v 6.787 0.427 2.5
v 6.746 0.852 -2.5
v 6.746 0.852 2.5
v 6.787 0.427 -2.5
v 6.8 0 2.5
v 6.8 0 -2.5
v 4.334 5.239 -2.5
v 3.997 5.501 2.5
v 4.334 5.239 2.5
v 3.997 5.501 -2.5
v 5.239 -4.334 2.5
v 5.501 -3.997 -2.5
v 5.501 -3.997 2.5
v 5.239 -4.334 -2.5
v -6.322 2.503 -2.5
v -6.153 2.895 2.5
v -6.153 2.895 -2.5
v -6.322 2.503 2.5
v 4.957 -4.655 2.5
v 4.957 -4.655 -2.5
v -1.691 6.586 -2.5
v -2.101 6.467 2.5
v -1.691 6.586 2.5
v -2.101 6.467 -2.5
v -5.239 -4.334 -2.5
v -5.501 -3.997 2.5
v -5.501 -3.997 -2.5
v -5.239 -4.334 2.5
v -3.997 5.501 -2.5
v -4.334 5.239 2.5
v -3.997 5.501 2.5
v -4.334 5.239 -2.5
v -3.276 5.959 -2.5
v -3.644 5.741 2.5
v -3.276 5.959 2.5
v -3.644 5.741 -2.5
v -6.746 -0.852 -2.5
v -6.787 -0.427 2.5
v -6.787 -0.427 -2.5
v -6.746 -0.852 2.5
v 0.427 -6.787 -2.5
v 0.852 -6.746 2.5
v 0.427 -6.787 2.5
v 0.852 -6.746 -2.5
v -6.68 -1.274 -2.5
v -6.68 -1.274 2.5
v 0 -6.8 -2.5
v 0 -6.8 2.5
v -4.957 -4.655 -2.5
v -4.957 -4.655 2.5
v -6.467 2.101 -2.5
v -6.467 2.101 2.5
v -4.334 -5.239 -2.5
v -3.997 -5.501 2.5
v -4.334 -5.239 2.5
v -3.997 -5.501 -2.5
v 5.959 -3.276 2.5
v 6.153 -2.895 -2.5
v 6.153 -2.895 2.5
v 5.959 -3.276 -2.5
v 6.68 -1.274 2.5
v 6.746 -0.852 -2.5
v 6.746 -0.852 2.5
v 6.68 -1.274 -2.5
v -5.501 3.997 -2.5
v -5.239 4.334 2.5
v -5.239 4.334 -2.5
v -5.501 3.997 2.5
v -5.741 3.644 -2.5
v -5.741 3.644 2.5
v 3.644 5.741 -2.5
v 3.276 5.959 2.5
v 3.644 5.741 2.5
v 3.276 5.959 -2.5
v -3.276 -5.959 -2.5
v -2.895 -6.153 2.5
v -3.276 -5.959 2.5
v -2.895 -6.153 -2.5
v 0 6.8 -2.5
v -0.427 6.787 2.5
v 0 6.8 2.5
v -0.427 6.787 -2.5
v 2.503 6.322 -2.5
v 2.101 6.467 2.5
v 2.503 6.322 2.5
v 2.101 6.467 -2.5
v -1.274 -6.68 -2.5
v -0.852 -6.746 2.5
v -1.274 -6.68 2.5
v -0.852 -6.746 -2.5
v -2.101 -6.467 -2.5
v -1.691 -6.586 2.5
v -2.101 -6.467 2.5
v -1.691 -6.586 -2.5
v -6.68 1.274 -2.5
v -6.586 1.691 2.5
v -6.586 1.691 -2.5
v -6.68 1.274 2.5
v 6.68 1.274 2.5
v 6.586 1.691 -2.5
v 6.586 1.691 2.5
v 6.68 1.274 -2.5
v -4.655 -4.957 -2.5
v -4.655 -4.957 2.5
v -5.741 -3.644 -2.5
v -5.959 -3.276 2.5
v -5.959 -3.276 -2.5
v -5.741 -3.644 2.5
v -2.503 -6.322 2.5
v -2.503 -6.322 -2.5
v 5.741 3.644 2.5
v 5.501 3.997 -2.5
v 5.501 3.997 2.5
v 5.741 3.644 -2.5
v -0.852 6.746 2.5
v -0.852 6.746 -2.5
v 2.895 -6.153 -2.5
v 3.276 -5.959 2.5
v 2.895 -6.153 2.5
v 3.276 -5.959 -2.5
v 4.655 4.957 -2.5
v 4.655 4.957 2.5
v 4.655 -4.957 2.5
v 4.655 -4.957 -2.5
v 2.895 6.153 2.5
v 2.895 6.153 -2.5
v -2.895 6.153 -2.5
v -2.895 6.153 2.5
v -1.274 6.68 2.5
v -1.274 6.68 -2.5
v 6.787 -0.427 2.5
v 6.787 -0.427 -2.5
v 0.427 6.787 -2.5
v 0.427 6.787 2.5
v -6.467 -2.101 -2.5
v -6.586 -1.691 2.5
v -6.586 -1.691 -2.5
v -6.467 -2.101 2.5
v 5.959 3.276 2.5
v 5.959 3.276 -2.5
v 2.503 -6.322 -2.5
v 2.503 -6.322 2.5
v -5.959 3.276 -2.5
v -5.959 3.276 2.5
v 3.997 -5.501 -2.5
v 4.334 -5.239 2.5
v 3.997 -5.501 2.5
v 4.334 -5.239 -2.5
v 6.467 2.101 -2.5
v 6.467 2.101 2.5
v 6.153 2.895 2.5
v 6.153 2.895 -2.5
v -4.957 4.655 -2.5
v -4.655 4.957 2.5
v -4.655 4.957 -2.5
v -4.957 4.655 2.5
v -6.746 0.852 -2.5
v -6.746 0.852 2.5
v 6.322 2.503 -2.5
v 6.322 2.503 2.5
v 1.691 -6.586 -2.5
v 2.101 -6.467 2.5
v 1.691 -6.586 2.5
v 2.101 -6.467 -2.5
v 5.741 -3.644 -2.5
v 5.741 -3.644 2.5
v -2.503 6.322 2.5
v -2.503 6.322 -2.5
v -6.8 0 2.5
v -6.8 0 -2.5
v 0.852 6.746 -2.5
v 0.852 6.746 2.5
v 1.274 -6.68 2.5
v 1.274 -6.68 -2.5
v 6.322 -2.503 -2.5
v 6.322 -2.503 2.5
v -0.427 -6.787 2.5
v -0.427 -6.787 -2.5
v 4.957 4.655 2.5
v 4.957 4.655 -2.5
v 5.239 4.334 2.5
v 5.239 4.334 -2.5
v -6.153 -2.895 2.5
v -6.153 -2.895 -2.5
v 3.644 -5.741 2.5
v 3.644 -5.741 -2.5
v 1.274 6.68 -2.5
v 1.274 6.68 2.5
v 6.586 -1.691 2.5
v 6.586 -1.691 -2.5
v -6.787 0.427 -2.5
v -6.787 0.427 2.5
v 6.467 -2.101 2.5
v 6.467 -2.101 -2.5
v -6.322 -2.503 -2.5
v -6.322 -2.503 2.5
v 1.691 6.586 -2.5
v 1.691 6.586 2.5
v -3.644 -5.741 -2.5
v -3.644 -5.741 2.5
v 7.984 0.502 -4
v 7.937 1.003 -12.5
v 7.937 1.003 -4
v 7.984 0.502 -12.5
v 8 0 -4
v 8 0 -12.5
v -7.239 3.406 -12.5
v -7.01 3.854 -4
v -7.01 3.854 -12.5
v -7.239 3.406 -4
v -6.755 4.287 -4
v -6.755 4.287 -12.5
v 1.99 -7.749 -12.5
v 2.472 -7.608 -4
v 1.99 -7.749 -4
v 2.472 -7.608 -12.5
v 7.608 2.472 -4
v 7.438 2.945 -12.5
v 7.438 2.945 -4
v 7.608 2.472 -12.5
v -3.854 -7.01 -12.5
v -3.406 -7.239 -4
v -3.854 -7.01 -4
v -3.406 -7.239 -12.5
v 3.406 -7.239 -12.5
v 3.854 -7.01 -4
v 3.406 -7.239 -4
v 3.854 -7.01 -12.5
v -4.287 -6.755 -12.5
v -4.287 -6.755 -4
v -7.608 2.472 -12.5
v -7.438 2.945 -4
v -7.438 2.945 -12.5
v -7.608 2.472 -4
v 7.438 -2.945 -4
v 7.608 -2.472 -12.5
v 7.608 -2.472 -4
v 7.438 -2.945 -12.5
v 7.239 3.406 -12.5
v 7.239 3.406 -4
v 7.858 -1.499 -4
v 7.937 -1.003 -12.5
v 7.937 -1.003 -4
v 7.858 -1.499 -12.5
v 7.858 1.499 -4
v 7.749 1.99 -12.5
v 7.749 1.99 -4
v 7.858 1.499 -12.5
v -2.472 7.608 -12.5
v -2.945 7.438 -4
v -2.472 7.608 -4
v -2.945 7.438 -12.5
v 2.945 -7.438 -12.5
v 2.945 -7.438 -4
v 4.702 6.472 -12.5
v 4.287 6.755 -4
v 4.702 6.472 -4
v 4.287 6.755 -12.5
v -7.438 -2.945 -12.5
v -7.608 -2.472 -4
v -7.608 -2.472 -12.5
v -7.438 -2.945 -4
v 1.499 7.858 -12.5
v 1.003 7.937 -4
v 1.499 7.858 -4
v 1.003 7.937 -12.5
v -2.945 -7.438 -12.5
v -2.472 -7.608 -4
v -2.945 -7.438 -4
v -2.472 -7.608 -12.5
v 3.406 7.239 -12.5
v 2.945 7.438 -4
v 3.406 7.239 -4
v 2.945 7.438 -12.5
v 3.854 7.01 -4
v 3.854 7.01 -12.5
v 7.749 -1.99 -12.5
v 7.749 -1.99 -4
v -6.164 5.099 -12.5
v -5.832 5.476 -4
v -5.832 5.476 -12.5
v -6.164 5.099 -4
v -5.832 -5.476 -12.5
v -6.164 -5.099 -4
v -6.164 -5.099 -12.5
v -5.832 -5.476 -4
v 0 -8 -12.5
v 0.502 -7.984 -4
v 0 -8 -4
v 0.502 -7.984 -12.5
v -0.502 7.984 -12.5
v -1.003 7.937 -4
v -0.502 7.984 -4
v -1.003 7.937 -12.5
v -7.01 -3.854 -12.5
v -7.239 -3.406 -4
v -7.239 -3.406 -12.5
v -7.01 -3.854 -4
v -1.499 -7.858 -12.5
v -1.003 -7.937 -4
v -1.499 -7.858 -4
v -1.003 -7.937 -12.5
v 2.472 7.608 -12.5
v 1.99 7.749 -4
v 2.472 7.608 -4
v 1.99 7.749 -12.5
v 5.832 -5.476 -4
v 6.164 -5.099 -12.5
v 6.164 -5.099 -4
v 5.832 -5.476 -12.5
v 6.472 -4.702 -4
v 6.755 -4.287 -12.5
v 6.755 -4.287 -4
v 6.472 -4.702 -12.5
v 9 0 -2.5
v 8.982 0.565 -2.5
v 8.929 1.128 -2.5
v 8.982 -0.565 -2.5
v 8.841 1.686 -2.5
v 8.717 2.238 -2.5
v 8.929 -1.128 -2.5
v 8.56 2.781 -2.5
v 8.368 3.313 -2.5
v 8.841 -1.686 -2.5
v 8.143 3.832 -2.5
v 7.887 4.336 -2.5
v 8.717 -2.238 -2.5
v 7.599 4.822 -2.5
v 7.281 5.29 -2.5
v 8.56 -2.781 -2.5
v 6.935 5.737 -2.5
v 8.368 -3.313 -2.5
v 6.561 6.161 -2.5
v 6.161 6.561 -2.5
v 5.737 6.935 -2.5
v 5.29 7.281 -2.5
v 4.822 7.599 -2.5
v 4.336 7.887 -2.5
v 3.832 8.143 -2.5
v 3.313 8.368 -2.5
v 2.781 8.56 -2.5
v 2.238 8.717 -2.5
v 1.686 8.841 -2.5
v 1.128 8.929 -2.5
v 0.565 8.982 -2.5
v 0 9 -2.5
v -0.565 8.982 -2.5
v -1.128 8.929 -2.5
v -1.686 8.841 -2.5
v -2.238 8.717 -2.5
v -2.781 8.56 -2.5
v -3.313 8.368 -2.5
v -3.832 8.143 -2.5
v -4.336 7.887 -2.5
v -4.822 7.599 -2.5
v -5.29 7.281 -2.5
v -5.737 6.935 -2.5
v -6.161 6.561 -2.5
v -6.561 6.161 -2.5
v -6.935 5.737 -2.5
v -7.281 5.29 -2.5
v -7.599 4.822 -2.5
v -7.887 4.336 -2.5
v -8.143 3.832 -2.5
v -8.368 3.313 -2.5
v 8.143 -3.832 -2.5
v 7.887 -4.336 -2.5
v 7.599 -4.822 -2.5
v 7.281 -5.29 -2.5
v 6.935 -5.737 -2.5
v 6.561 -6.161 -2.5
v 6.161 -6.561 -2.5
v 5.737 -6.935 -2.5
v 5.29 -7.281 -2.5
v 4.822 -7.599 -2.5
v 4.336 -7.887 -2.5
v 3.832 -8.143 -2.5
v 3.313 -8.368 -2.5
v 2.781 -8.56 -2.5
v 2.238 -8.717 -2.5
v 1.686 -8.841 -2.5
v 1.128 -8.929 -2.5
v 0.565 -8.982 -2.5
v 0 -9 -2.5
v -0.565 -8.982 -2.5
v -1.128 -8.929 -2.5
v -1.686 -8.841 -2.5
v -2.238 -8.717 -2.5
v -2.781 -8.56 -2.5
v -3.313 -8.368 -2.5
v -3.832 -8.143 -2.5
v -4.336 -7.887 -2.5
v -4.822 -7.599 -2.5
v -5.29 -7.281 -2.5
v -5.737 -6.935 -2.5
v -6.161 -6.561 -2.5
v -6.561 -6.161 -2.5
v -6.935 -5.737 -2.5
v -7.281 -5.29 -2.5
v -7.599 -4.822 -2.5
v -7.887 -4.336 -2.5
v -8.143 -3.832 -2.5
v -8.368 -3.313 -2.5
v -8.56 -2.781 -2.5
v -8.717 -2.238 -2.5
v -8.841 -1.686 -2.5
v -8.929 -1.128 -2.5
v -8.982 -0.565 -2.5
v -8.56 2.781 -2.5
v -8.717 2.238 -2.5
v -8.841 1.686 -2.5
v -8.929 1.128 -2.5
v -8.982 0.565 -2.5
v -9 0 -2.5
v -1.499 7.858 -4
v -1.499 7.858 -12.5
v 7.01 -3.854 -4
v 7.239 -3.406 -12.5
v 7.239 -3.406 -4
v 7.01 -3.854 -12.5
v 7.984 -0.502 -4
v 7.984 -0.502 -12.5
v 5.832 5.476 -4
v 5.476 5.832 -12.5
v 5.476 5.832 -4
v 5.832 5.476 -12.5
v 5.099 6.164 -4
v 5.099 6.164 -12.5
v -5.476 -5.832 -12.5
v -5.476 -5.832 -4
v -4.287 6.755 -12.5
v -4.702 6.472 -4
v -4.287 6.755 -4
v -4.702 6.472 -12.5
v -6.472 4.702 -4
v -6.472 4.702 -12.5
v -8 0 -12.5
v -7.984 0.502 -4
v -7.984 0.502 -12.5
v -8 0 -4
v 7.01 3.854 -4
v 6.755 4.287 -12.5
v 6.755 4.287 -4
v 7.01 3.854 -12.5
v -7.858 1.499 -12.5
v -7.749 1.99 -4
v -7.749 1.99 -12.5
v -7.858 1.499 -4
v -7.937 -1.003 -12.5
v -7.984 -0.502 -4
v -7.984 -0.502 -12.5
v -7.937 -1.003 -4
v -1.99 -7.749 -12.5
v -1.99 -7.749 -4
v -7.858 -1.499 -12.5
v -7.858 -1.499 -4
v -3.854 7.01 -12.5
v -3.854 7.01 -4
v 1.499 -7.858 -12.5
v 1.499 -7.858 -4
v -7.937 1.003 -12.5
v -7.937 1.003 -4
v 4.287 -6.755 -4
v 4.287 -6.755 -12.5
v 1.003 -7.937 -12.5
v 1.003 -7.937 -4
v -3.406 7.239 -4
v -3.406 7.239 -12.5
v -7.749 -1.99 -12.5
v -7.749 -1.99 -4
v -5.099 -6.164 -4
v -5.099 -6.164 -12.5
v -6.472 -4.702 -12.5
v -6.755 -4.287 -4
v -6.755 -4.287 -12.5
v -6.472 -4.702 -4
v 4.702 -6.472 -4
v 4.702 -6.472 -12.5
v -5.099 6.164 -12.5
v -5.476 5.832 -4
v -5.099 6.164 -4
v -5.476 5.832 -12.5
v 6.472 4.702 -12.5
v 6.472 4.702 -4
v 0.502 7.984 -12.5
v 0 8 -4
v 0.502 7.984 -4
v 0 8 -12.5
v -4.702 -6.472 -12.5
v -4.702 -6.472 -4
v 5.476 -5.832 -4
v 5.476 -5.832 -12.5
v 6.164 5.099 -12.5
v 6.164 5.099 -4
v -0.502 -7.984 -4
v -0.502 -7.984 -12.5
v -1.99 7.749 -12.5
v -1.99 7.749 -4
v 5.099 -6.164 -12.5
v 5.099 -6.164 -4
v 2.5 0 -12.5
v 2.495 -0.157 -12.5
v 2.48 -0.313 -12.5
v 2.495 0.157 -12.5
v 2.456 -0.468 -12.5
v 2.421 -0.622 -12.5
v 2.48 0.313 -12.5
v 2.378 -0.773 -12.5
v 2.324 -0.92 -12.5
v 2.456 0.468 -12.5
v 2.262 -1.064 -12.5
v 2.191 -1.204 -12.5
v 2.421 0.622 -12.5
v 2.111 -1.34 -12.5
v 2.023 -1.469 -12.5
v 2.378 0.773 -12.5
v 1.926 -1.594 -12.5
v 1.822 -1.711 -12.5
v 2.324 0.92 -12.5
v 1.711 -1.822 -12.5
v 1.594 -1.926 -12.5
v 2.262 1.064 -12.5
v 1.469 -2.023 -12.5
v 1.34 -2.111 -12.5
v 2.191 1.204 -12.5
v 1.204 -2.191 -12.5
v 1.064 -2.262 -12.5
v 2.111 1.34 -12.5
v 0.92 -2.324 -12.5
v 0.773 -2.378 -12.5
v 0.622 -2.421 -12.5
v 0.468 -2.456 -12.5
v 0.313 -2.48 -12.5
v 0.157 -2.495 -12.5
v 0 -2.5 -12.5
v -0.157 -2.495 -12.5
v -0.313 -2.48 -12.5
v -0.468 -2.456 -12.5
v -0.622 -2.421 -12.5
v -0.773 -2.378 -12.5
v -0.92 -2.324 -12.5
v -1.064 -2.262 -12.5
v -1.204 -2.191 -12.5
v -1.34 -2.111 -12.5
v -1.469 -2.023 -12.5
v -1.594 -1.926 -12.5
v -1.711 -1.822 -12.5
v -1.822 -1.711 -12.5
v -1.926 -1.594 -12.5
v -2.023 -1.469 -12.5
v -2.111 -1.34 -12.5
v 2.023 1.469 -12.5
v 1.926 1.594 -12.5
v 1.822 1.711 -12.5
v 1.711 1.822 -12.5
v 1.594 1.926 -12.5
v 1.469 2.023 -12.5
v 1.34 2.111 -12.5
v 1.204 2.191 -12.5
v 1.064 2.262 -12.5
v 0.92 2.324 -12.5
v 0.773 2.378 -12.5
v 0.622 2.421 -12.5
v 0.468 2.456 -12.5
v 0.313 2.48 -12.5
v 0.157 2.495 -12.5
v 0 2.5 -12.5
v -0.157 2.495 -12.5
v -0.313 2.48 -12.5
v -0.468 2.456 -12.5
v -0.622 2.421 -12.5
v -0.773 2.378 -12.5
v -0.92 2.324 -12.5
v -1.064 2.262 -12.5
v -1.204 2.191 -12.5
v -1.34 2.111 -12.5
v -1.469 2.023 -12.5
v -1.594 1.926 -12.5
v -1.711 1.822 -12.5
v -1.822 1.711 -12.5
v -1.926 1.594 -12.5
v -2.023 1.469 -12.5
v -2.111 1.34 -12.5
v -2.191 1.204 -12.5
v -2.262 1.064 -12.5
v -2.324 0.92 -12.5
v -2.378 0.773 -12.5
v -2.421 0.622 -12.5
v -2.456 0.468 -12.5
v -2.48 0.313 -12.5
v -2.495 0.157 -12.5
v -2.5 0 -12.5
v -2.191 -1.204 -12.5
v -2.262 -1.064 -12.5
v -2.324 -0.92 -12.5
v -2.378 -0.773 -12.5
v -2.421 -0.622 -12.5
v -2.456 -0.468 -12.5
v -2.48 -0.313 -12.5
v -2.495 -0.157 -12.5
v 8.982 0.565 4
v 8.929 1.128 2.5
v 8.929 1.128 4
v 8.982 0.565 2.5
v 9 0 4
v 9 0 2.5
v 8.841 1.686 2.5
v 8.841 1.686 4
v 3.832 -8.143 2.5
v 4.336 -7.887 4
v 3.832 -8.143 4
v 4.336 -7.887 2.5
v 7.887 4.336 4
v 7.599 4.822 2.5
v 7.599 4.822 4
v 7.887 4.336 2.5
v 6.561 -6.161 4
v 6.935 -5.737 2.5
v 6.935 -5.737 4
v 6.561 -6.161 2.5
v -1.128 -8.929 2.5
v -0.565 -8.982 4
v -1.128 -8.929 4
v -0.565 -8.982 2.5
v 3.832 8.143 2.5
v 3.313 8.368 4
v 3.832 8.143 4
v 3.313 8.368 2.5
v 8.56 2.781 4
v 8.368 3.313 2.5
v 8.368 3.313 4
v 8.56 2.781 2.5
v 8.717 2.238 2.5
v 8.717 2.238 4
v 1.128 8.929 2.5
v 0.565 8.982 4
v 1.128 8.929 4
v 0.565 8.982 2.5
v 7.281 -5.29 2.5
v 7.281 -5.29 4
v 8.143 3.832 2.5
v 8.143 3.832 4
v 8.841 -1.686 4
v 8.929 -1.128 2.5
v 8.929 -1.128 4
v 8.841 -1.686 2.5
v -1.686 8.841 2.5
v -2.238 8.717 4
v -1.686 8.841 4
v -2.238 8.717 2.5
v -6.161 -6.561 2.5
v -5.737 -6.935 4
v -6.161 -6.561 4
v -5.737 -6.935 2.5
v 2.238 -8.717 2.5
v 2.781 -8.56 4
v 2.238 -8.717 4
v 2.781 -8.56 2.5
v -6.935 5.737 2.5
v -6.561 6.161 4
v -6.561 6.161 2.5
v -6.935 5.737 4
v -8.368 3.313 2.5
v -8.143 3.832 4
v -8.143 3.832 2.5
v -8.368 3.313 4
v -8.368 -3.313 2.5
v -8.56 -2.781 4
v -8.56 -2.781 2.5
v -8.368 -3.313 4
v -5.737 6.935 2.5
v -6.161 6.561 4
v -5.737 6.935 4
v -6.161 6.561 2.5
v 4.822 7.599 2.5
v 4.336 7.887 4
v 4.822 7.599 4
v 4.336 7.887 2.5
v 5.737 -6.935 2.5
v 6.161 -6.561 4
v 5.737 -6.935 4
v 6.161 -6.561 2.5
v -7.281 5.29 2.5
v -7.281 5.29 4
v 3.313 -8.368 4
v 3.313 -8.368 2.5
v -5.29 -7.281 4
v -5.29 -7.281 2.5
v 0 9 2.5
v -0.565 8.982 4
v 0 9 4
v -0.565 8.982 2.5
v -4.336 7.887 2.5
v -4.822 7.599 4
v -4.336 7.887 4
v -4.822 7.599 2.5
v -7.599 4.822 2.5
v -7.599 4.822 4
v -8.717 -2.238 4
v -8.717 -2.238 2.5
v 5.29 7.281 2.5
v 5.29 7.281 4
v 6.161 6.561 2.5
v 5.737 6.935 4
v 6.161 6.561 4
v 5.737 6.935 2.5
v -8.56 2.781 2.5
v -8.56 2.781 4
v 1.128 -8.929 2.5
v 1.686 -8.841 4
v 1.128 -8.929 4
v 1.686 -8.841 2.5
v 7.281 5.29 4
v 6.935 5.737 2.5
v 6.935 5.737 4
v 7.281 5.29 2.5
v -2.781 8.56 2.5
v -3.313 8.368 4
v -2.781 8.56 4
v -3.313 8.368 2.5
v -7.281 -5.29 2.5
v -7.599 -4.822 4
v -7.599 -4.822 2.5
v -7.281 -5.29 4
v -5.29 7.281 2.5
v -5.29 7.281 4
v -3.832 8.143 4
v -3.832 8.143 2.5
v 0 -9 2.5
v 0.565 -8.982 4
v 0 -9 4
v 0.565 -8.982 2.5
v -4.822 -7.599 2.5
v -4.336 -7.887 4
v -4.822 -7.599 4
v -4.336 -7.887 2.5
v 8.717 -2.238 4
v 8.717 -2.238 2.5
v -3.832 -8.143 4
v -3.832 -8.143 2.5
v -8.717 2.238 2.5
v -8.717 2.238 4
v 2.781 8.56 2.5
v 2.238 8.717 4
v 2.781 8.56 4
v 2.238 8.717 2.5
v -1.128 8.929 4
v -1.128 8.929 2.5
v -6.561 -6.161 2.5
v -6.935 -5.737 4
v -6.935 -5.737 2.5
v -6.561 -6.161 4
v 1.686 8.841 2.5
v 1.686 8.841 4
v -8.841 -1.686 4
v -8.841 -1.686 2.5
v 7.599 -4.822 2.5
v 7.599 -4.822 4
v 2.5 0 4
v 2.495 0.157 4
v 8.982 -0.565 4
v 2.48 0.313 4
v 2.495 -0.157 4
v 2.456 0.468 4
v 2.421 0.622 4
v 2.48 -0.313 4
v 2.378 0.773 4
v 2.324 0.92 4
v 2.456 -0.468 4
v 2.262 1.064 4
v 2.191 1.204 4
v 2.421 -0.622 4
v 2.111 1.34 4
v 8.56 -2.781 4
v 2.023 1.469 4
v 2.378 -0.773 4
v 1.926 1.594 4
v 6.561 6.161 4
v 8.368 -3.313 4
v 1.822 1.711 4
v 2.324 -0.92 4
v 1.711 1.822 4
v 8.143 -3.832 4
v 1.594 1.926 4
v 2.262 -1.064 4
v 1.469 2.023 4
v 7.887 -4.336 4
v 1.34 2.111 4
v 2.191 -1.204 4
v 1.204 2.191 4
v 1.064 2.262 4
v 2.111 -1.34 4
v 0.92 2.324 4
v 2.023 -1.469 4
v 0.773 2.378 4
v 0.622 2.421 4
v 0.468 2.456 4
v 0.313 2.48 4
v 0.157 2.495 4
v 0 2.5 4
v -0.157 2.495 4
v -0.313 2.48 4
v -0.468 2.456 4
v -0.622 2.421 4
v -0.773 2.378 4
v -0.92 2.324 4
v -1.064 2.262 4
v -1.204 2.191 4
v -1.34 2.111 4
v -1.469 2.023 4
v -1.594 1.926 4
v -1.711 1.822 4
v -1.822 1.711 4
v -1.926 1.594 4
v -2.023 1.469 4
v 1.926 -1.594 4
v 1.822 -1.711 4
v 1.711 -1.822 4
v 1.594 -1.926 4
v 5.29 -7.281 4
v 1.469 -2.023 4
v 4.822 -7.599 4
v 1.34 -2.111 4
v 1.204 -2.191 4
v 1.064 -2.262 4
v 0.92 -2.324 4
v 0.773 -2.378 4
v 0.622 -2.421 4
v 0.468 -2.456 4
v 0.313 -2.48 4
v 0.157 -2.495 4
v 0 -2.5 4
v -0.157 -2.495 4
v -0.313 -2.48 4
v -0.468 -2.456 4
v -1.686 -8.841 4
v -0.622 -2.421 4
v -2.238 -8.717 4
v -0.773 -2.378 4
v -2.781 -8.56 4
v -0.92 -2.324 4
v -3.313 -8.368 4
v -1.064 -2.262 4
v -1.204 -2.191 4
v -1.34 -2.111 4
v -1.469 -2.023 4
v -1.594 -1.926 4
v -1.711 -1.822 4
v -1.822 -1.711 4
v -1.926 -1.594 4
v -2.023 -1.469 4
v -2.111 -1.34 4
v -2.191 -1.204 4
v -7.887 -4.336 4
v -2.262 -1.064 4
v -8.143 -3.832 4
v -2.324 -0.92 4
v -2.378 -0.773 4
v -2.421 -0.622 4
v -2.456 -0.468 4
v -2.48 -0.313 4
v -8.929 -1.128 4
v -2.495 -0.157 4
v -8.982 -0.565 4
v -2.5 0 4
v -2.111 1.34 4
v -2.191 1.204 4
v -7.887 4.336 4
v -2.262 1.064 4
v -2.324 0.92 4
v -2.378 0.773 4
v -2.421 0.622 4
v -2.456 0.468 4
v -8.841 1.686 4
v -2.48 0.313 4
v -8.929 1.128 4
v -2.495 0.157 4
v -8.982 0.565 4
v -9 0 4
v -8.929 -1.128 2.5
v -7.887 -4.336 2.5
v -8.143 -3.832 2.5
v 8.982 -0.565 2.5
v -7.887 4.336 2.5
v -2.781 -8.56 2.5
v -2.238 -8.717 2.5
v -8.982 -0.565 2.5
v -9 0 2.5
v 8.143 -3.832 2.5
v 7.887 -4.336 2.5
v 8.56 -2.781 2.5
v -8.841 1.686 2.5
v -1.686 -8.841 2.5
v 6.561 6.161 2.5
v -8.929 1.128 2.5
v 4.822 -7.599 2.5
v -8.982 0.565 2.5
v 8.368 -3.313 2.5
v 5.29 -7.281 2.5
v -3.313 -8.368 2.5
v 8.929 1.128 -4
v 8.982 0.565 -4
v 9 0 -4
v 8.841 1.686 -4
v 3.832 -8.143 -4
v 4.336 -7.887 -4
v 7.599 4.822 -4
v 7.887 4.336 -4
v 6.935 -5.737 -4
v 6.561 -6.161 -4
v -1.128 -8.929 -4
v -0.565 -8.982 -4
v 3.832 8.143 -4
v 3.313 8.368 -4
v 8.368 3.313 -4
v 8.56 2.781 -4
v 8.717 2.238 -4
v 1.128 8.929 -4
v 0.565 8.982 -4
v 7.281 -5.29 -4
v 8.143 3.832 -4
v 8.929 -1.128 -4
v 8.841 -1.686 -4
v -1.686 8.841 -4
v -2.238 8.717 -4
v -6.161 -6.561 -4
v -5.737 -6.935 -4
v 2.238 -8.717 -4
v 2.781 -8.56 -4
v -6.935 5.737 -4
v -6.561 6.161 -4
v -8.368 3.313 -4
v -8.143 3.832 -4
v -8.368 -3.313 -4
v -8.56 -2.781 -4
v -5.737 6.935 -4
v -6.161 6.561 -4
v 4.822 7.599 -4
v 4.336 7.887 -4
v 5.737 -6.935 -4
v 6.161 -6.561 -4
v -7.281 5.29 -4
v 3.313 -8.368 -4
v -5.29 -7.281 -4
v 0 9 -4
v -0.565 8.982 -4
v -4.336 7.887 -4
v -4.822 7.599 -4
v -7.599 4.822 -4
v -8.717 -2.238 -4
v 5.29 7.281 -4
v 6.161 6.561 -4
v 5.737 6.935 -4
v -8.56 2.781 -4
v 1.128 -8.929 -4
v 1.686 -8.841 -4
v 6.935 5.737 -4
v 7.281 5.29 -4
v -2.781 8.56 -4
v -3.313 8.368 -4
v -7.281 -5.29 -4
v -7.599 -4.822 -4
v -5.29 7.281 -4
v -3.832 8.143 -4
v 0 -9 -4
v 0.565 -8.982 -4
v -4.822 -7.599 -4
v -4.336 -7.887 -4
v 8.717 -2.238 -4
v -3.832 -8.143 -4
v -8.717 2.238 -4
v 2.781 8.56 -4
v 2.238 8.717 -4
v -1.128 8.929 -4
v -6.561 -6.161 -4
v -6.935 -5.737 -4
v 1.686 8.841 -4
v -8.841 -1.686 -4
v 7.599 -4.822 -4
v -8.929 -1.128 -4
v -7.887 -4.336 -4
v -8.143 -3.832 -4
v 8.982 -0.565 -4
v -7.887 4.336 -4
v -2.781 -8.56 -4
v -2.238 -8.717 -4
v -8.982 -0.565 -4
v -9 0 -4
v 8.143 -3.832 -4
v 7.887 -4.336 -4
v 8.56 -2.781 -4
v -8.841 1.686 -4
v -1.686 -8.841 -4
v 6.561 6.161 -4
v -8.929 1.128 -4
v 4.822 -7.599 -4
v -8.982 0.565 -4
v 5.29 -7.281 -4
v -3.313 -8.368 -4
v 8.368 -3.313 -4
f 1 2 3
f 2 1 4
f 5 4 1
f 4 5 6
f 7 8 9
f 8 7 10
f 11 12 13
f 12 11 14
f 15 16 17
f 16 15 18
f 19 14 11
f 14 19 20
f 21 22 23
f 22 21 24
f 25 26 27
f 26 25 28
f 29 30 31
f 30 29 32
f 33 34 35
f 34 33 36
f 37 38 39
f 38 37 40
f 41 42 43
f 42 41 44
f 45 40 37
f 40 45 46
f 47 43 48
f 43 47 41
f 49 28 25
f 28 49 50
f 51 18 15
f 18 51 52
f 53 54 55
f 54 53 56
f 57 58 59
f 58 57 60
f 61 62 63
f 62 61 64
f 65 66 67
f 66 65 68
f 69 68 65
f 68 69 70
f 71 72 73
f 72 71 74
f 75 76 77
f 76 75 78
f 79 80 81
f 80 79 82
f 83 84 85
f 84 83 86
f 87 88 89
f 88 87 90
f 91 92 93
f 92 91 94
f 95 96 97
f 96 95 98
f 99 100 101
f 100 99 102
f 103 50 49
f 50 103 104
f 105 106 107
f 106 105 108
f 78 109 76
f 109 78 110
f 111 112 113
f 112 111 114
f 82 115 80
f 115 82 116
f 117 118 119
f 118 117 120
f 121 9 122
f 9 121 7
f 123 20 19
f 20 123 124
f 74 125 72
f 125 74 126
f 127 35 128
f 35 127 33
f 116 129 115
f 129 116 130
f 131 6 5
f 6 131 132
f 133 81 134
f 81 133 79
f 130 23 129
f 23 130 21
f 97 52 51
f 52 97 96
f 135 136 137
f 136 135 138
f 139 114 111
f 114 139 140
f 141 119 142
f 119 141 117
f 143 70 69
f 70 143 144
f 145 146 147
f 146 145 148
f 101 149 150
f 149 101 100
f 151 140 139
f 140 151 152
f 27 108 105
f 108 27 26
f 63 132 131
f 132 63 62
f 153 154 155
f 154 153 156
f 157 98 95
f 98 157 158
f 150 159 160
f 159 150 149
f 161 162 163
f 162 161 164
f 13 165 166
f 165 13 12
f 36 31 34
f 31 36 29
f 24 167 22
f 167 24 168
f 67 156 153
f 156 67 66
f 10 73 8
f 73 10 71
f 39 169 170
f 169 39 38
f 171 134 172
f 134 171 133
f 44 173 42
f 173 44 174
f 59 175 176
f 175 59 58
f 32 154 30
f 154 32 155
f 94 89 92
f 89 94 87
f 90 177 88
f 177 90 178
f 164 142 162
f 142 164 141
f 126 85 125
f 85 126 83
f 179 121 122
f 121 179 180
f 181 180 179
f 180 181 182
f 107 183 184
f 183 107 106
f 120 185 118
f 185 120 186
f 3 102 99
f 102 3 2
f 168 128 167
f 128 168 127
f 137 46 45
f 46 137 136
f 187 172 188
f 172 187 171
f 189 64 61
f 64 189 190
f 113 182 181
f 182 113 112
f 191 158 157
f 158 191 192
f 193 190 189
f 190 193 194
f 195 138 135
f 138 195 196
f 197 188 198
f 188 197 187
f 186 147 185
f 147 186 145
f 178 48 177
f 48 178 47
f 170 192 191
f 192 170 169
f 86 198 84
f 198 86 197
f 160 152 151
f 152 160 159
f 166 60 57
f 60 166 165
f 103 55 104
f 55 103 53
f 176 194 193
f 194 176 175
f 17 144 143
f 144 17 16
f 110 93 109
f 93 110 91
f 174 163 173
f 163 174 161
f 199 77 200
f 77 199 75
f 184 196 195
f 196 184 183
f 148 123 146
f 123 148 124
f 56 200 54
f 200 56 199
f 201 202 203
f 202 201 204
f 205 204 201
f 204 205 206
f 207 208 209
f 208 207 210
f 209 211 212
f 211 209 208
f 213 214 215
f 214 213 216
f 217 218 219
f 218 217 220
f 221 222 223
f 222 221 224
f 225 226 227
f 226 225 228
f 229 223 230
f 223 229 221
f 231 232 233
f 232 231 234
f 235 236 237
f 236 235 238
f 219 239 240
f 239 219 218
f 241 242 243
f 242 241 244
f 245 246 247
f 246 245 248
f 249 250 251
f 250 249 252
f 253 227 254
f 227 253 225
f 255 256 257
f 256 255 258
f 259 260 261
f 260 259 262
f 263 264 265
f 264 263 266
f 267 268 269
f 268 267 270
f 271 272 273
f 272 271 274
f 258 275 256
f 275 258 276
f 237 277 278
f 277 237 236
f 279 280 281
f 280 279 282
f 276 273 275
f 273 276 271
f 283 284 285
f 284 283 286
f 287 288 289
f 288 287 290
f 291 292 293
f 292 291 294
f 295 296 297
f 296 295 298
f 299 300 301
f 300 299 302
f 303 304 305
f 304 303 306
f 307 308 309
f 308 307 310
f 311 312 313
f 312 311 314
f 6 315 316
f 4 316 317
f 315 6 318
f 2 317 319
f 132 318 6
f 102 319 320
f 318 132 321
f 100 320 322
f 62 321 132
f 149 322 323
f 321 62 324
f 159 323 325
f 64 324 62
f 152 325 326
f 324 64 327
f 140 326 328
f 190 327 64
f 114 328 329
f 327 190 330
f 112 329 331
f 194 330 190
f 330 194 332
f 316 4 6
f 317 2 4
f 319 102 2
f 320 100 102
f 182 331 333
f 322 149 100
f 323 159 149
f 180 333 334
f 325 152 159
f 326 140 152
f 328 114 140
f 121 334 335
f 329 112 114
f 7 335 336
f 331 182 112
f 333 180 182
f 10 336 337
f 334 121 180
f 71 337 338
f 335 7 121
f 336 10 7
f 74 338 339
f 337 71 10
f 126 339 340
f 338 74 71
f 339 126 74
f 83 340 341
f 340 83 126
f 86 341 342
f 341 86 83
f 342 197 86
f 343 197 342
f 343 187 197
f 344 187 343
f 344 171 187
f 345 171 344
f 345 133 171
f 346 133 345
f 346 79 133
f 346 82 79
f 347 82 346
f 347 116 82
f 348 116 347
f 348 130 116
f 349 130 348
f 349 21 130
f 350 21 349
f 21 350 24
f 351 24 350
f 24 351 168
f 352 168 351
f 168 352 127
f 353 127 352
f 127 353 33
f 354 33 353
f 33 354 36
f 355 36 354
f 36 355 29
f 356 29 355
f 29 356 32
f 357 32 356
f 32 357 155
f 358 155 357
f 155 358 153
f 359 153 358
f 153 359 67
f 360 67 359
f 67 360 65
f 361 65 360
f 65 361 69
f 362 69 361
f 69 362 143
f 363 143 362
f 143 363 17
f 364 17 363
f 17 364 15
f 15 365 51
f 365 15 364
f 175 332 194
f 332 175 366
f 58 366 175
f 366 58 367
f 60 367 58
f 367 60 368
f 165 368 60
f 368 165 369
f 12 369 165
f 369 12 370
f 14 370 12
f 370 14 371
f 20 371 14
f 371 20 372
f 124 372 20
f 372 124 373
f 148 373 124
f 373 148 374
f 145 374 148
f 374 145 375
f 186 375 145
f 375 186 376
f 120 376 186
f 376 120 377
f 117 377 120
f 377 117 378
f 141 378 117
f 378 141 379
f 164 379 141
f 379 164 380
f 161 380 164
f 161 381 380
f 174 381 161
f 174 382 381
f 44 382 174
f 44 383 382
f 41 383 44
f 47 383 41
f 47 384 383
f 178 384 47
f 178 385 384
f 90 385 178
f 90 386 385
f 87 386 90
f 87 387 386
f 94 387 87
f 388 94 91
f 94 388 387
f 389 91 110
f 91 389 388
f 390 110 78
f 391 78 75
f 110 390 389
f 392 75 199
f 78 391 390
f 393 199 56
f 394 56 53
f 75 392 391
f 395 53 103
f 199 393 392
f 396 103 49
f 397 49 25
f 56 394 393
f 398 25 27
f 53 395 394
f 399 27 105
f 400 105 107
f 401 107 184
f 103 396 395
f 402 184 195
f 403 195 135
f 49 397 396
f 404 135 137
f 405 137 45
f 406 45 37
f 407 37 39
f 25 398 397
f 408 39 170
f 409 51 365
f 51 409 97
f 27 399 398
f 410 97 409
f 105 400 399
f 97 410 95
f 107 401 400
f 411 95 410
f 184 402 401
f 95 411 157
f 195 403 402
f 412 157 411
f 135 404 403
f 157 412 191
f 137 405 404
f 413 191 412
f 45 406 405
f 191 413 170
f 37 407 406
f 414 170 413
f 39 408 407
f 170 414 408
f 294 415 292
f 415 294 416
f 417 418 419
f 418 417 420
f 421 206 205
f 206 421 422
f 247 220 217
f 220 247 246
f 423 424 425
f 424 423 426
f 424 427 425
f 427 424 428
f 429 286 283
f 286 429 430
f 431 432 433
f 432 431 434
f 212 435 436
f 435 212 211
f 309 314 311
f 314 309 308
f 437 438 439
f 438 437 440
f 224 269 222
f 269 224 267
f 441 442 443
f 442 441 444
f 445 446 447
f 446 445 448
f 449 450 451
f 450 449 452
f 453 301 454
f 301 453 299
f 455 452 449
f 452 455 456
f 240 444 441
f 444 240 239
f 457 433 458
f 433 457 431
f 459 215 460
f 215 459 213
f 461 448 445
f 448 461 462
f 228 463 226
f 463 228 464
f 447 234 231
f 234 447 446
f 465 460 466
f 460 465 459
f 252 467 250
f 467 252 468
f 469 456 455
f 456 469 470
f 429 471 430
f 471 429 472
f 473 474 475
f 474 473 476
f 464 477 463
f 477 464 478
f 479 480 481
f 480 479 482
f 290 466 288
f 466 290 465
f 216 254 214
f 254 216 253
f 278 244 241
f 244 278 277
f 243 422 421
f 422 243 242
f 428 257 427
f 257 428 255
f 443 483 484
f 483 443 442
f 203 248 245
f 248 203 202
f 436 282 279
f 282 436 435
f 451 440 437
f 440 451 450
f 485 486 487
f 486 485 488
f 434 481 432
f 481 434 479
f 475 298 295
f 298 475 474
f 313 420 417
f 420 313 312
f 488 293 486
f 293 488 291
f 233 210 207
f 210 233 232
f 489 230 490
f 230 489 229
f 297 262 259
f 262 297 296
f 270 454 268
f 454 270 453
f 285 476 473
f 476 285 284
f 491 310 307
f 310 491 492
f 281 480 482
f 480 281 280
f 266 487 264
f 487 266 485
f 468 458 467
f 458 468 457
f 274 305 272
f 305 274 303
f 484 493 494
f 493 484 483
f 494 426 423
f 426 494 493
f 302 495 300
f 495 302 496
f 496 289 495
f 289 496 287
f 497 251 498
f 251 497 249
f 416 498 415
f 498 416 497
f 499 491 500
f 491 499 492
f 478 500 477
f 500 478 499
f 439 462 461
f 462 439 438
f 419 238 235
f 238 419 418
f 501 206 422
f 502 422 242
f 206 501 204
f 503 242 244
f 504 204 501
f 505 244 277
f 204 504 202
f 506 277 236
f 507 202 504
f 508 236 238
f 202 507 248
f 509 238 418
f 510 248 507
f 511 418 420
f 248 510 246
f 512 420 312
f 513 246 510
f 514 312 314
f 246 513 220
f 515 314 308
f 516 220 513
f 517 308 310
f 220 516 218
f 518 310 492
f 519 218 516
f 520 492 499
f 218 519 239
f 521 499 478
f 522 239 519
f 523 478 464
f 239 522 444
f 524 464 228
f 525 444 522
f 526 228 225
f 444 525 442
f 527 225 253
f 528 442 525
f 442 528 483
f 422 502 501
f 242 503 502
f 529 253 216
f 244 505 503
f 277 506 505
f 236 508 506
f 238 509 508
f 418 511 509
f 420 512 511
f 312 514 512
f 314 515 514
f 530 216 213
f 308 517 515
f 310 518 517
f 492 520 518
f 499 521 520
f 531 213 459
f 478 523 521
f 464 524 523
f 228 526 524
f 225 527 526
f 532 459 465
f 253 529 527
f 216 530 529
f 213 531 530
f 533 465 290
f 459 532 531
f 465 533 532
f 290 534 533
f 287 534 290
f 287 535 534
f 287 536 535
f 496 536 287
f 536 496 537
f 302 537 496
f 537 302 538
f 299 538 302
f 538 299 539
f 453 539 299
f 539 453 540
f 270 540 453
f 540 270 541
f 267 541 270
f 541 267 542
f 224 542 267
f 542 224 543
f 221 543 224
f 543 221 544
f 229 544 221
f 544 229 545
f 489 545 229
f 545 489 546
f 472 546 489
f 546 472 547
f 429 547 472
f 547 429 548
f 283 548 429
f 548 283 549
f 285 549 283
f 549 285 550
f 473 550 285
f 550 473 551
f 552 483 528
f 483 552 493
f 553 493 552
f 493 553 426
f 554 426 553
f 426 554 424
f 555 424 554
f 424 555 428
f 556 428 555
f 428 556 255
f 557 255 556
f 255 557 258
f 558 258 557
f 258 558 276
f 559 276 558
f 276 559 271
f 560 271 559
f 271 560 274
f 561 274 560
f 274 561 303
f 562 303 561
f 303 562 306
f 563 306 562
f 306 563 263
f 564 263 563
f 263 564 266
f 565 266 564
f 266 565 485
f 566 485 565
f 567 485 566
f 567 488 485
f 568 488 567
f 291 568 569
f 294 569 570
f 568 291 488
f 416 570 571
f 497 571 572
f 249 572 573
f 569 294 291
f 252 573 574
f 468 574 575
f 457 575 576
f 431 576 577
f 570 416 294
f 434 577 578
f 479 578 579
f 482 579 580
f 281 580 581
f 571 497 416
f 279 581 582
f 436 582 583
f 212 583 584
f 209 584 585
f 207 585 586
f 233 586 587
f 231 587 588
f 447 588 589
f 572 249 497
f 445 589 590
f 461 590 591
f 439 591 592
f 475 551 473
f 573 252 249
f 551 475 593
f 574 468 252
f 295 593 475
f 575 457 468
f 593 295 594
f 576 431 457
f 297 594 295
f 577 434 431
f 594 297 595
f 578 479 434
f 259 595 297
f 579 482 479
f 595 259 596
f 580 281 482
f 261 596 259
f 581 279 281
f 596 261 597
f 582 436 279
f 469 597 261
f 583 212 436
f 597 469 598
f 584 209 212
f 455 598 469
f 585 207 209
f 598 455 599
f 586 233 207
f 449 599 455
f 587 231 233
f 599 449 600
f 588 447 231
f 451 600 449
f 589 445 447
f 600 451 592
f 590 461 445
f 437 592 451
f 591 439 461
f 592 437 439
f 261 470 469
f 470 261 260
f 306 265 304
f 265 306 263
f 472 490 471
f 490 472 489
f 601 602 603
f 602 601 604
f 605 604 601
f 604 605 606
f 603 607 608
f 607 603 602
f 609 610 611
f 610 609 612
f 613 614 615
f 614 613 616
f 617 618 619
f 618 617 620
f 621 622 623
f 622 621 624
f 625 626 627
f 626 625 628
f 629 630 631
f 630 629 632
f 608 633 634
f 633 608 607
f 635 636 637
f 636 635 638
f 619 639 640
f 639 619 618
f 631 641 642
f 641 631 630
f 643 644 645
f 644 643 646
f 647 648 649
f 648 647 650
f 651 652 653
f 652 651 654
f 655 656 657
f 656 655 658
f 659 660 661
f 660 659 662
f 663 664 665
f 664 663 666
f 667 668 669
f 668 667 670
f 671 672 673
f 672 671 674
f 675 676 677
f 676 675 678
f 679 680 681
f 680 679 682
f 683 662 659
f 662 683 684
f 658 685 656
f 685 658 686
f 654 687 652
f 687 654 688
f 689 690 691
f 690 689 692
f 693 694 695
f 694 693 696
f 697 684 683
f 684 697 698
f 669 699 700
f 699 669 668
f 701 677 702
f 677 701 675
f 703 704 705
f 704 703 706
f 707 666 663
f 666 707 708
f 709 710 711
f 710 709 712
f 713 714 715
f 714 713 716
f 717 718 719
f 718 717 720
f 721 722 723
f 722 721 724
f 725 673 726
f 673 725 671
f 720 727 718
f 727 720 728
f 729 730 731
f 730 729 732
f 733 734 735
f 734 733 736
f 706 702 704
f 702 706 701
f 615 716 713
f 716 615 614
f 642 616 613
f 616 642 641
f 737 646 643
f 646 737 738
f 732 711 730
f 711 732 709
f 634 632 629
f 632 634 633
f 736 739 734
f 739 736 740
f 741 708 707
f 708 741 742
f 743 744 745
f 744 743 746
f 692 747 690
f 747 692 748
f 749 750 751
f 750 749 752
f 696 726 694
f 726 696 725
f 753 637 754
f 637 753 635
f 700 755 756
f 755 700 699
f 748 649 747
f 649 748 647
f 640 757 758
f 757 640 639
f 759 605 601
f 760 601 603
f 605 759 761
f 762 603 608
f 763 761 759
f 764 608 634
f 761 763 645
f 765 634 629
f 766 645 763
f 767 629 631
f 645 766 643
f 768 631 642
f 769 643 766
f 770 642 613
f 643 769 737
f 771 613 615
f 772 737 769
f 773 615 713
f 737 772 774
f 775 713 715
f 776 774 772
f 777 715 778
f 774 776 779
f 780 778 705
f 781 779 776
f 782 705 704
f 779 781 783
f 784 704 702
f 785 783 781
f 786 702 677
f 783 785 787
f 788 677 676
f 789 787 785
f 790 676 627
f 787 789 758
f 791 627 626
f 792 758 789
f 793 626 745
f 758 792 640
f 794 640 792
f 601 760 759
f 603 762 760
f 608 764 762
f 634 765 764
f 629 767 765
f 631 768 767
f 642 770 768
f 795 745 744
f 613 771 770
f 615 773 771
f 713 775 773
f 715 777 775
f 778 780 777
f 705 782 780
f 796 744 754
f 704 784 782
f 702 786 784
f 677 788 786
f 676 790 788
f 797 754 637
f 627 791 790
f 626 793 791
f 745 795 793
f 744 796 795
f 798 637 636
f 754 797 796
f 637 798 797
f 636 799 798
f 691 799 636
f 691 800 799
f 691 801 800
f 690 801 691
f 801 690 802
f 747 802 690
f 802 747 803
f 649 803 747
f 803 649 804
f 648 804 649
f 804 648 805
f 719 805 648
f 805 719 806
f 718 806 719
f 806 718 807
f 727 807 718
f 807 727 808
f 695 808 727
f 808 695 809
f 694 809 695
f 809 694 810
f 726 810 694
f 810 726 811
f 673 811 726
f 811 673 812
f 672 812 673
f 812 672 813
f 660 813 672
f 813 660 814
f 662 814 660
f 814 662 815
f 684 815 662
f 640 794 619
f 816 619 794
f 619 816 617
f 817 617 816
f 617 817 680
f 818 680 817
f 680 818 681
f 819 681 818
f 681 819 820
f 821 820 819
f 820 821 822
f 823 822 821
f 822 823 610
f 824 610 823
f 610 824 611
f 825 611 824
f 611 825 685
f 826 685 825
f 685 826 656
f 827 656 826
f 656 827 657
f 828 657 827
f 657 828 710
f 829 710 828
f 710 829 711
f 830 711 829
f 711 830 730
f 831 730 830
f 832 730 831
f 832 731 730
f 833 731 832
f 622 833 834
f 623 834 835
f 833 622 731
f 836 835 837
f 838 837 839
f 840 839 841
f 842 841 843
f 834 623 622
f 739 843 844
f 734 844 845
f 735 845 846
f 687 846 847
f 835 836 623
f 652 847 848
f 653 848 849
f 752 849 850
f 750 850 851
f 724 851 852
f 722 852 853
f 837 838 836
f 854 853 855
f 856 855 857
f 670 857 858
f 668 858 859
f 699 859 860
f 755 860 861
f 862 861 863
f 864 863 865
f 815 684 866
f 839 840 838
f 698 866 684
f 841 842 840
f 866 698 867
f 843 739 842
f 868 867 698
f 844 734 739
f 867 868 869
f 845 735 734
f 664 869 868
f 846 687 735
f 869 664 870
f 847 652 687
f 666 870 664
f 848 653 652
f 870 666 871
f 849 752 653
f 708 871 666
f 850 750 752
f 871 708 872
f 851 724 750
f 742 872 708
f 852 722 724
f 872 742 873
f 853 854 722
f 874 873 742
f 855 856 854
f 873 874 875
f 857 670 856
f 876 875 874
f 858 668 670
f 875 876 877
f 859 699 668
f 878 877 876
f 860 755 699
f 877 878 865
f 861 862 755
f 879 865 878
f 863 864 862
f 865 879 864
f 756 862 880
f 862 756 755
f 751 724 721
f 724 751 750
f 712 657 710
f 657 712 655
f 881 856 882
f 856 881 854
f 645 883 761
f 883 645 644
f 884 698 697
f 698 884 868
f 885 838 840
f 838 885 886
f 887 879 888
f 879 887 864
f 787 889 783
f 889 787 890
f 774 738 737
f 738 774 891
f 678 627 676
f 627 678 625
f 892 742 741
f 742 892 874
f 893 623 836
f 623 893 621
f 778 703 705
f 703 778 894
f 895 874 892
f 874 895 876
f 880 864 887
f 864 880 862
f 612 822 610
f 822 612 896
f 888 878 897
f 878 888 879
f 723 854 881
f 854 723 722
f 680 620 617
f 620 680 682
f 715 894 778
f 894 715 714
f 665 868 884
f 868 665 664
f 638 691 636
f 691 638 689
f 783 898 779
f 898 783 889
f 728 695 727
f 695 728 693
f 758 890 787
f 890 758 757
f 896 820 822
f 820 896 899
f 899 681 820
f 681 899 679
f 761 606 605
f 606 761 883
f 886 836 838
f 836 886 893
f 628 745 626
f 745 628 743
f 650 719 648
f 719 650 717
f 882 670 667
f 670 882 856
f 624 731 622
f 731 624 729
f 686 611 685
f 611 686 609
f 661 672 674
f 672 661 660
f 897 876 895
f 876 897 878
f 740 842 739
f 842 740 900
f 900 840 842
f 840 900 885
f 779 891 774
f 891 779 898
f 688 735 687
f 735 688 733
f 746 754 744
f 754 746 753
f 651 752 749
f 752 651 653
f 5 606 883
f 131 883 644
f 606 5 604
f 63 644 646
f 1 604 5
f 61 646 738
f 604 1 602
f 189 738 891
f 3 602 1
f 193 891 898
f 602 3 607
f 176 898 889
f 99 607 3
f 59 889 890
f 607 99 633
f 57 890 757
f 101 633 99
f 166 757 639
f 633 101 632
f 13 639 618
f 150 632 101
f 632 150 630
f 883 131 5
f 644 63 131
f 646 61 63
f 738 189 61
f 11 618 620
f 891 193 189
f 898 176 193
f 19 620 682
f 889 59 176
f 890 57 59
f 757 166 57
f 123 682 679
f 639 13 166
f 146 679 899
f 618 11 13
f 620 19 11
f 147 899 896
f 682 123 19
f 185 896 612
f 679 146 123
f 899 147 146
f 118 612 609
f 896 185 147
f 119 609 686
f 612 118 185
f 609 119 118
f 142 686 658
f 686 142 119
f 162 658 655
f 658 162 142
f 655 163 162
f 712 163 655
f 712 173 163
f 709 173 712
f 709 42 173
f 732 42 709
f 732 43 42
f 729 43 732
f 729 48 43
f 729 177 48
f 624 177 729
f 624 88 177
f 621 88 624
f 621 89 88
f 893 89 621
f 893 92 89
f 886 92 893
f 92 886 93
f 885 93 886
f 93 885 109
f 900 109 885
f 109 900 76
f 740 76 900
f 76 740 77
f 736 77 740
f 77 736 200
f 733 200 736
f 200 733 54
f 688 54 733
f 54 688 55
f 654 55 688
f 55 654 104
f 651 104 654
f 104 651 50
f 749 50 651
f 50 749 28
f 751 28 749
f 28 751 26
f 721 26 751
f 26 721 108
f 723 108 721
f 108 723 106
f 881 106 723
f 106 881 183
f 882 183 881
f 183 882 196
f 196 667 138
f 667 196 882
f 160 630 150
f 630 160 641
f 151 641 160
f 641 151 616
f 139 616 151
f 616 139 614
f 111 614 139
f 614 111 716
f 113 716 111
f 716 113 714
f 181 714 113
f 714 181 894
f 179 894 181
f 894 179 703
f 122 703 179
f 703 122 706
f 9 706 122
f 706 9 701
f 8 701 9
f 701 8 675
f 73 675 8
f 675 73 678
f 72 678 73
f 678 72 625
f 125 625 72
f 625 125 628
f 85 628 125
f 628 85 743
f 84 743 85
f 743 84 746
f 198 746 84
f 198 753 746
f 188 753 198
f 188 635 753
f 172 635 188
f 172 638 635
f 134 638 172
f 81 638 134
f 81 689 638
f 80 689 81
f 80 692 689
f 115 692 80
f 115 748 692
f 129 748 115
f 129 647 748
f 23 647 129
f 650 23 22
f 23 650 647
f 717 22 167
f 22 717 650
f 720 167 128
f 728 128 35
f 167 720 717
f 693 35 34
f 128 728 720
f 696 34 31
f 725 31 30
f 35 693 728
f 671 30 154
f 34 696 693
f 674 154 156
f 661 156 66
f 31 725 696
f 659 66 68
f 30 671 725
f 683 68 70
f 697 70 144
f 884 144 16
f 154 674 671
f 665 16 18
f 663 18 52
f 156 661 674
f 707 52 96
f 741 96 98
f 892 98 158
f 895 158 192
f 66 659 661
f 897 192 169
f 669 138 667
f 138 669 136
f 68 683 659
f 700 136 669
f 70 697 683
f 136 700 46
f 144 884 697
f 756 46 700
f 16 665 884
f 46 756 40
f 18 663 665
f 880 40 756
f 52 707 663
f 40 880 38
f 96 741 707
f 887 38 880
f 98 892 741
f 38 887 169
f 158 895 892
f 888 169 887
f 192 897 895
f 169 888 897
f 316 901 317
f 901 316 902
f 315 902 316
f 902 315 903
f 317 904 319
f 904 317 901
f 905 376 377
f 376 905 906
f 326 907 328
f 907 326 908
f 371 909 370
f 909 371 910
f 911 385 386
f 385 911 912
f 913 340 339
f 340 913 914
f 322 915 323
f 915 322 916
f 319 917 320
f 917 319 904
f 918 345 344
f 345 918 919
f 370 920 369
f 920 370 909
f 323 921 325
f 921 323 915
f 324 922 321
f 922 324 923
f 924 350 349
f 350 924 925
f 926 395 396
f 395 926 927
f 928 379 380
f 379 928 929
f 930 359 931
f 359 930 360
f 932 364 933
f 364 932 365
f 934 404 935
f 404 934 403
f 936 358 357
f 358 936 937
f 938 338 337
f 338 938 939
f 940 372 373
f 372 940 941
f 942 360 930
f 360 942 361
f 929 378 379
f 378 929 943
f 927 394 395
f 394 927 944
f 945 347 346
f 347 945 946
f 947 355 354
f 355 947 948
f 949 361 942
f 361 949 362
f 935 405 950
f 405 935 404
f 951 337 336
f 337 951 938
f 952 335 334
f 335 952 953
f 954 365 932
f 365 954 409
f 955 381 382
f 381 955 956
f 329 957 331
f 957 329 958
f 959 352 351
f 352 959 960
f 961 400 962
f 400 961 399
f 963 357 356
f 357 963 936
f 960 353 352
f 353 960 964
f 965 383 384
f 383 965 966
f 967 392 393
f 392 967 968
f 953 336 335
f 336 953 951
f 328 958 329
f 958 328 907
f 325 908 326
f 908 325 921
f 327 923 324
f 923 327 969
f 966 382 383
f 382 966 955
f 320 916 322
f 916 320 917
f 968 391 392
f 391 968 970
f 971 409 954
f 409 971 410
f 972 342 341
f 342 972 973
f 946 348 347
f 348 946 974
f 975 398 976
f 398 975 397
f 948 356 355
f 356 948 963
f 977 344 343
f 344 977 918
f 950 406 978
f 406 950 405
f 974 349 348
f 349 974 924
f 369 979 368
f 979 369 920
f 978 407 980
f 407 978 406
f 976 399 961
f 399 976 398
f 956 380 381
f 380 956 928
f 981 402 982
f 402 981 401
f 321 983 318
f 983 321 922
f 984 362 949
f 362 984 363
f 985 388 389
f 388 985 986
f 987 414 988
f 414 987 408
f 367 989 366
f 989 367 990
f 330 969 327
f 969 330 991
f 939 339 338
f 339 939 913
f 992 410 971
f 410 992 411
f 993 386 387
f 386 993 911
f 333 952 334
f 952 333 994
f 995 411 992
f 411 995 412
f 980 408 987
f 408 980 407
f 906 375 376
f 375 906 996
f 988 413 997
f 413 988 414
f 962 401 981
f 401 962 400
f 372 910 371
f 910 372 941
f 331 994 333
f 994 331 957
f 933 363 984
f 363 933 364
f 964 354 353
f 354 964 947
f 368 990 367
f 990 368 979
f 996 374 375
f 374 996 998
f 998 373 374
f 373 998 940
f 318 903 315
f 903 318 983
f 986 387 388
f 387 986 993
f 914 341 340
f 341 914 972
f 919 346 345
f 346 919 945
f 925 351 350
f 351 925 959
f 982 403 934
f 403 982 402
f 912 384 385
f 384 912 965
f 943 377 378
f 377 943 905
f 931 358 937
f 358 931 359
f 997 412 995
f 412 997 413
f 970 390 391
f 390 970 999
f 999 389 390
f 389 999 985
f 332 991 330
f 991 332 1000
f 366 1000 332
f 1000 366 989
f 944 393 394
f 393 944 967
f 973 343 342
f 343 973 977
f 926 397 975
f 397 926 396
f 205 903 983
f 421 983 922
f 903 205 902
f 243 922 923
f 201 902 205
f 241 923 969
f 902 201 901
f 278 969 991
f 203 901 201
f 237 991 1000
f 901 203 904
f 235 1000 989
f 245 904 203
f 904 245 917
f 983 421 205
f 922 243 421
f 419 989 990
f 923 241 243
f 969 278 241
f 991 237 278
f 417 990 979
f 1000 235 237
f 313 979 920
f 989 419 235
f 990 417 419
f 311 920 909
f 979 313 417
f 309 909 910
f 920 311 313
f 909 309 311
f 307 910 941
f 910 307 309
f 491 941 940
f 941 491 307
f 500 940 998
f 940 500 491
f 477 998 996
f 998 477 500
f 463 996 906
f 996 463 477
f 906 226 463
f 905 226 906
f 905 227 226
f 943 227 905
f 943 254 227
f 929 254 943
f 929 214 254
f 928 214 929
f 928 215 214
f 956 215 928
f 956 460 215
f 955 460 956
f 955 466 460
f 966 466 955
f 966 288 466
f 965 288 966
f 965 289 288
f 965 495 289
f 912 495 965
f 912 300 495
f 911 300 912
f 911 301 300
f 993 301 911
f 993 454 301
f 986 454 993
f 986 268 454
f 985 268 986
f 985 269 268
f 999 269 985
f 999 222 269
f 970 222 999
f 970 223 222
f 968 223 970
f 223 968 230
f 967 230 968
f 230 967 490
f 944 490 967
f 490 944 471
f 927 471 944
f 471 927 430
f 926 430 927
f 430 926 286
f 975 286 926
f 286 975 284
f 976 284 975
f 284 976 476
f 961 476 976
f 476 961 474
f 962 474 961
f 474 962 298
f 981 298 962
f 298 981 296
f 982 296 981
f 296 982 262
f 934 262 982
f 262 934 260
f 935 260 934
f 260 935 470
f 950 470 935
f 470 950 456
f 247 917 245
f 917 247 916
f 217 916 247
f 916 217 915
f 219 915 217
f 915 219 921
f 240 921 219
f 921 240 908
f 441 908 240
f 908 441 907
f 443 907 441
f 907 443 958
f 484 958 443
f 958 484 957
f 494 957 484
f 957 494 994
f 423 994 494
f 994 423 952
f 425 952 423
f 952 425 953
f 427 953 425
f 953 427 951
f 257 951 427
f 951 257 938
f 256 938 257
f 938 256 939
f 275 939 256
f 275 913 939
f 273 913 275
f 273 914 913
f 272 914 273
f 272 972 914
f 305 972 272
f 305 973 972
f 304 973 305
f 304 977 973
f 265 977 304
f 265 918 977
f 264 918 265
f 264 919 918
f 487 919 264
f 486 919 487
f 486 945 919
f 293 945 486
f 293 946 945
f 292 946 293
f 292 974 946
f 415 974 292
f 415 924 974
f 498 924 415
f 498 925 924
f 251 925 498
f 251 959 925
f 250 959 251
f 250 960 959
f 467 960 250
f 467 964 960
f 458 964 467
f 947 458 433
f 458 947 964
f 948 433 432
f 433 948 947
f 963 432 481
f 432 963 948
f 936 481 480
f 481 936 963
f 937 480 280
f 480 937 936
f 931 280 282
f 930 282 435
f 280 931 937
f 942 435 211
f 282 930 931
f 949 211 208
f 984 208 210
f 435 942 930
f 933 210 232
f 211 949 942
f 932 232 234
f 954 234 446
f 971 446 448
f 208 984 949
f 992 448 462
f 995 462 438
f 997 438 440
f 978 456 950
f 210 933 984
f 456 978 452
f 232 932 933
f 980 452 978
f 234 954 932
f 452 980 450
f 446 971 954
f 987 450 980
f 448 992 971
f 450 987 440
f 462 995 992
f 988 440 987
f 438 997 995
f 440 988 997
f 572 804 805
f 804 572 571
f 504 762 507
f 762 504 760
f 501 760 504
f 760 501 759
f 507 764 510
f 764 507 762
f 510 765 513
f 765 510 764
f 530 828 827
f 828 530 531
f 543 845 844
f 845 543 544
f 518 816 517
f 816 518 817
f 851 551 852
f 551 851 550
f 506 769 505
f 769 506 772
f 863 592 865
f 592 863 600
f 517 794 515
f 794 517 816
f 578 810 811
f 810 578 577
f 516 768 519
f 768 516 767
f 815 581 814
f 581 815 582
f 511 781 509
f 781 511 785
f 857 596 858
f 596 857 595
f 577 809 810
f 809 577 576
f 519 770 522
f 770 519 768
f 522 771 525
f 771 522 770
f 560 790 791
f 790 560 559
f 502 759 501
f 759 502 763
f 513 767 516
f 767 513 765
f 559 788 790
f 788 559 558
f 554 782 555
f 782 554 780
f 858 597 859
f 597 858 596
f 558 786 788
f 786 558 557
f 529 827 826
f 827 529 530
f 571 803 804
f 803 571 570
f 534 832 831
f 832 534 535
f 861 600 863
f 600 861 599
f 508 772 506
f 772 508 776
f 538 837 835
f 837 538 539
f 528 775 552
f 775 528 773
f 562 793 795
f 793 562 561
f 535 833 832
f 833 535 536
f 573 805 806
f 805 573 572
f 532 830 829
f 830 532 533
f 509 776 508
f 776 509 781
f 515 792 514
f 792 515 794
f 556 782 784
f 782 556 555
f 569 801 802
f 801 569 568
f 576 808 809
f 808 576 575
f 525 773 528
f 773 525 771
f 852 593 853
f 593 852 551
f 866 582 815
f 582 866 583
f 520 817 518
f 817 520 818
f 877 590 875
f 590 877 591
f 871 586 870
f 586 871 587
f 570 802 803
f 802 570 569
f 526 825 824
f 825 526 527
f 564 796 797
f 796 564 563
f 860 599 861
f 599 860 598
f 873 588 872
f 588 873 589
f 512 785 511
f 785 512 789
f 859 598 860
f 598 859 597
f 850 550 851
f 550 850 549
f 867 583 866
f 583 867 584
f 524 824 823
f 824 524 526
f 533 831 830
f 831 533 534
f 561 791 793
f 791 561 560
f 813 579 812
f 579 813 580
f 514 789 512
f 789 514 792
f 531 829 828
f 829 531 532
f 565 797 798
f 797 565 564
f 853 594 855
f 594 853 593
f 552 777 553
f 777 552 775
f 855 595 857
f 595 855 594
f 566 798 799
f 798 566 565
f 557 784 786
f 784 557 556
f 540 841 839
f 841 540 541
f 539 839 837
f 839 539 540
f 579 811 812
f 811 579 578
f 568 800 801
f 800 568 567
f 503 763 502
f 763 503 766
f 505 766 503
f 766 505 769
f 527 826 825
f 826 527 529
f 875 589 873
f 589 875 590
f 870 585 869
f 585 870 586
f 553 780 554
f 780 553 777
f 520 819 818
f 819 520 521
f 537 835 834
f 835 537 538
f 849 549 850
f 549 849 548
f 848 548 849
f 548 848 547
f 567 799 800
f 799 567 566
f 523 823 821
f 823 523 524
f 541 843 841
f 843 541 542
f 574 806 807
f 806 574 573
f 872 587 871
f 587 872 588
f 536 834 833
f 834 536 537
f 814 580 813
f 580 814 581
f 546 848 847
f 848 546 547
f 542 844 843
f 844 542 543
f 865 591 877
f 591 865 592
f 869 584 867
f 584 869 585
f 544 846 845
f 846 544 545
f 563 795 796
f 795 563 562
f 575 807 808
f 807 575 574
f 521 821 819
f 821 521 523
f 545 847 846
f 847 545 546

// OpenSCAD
// Parameters
tooth_count = 20; //[10:60:1]
pitch_diameter_mm = 12.22; //[6.11:24.44:0.01]
pitch_radius_mm = 6.11; //[3.055:12.22:0.01]
belt_pitch_mm = 2; //[1:5:0.01]
outside_diameter_mm = 13.6; //[6.8:27.2:0.01]
root_diameter_mm = 10.8; //[5.4:21.6:0.01]
pulley_width_mm = 7; //[3.5:14:0.1]
bore_diameter_mm = 5; //[2:10:0.01]
hub_diameter_mm = 16; //[8:32:0.1]
hub_length_mm = 10; //[5:20:0.1]
flange_diameter_mm = 18; //[9:36:0.1]
flange_thickness_mm = 1.5; //[0.8:3:0.1]
overlap_mm = 1; //[0.5:2:0.1]
tooth_round_r_mm = 0.55; //[0.3:1.2:0.01]

// Pulley - complete geometry
module pulley() {
  color("Silver") {
    union() {
      // Toothed pulley body
      translate([0, 0, 0])
        cylinder(r=outside_diameter_mm/2, h=pulley_width_mm, center=true, $fn=100);
      
      // Hub
      translate([0, 0, -(pulley_width_mm/2 + hub_length_mm/2 - overlap_mm)])
        cylinder(r=hub_diameter_mm/2, h=hub_length_mm, center=true, $fn=100);
      
      // Flange top
      translate([0, 0, pulley_width_mm/2 + flange_thickness_mm/2 - overlap_mm])
        cylinder(r=flange_diameter_mm/2, h=flange_thickness_mm, center=true, $fn=100);
      
      // Flange bottom
      translate([0, 0, -(pulley_width_mm/2 + flange_thickness_mm/2 - overlap_mm)])
        cylinder(r=flange_diameter_mm/2, h=flange_thickness_mm, center=true, $fn=100);
    }
  }
}

// Printed Pulley Teeth - complete geometry
module printed_pulley_teeth() {
  color("DimGray") {
    rotate_extrude($fn=tooth_count)
      polygon(points=[
        [root_diameter_mm/2, -pulley_width_mm/2],
        [outside_diameter_mm/2, -pulley_width_mm/2],
        [outside_diameter_mm/2, pulley_width_mm/2],
        [root_diameter_mm/2, pulley_width_mm/2]
      ]);
  }
}

// Printed Pulley Teeth From Profile - complete geometry
module printed_pulley_teeth_from_profile() {
  color("DimGray") {
    rotate_extrude($fn=tooth_count)
      polygon(points=[
        [root_diameter_mm/2, -pulley_width_mm/2],
        [outside_diameter_mm/2, -pulley_width_mm/2],
        [outside_diameter_mm/2, pulley_width_mm/2],
        [root_diameter_mm/2, pulley_width_mm/2]
      ]);
  }
}

// Printed Pulley GT2 Teeth - complete geometry
module printed_pulley_GT2_teeth() {
  color("DimGray") {
    rotate_extrude($fn=tooth_count)
      polygon(points=[
        [pitch_radius_mm - (pitch_diameter_mm*3.141592653589793/tooth_count)/4, -pulley_width_mm/2],
        [pitch_radius_mm + (pitch_diameter_mm*3.141592653589793/tooth_count)/4, -pulley_width_mm/2],
        [pitch_radius_mm + (pitch_diameter_mm*3.141592653589793/tooth_count)/4, pulley_width_mm/2],
        [pitch_radius_mm - (pitch_diameter_mm*3.141592653589793/tooth_count)/4, pulley_width_mm/2]
      ]);
  }
}

// Assembly
module assembly() {
  difference() {
    pulley();
    // Bore
    translate([0, 0, -(hub_length_mm/2 - overlap_mm)])
      cylinder(r=bore_diameter_mm/2, h=pulley_width_mm + hub_length_mm + 2*flange_thickness_mm + 4*overlap_mm, center=true, $fn=100);
  }
  printed_pulley_teeth();
  printed_pulley_teeth_from_profile();
  printed_pulley_GT2_teeth();
}

assembly();
